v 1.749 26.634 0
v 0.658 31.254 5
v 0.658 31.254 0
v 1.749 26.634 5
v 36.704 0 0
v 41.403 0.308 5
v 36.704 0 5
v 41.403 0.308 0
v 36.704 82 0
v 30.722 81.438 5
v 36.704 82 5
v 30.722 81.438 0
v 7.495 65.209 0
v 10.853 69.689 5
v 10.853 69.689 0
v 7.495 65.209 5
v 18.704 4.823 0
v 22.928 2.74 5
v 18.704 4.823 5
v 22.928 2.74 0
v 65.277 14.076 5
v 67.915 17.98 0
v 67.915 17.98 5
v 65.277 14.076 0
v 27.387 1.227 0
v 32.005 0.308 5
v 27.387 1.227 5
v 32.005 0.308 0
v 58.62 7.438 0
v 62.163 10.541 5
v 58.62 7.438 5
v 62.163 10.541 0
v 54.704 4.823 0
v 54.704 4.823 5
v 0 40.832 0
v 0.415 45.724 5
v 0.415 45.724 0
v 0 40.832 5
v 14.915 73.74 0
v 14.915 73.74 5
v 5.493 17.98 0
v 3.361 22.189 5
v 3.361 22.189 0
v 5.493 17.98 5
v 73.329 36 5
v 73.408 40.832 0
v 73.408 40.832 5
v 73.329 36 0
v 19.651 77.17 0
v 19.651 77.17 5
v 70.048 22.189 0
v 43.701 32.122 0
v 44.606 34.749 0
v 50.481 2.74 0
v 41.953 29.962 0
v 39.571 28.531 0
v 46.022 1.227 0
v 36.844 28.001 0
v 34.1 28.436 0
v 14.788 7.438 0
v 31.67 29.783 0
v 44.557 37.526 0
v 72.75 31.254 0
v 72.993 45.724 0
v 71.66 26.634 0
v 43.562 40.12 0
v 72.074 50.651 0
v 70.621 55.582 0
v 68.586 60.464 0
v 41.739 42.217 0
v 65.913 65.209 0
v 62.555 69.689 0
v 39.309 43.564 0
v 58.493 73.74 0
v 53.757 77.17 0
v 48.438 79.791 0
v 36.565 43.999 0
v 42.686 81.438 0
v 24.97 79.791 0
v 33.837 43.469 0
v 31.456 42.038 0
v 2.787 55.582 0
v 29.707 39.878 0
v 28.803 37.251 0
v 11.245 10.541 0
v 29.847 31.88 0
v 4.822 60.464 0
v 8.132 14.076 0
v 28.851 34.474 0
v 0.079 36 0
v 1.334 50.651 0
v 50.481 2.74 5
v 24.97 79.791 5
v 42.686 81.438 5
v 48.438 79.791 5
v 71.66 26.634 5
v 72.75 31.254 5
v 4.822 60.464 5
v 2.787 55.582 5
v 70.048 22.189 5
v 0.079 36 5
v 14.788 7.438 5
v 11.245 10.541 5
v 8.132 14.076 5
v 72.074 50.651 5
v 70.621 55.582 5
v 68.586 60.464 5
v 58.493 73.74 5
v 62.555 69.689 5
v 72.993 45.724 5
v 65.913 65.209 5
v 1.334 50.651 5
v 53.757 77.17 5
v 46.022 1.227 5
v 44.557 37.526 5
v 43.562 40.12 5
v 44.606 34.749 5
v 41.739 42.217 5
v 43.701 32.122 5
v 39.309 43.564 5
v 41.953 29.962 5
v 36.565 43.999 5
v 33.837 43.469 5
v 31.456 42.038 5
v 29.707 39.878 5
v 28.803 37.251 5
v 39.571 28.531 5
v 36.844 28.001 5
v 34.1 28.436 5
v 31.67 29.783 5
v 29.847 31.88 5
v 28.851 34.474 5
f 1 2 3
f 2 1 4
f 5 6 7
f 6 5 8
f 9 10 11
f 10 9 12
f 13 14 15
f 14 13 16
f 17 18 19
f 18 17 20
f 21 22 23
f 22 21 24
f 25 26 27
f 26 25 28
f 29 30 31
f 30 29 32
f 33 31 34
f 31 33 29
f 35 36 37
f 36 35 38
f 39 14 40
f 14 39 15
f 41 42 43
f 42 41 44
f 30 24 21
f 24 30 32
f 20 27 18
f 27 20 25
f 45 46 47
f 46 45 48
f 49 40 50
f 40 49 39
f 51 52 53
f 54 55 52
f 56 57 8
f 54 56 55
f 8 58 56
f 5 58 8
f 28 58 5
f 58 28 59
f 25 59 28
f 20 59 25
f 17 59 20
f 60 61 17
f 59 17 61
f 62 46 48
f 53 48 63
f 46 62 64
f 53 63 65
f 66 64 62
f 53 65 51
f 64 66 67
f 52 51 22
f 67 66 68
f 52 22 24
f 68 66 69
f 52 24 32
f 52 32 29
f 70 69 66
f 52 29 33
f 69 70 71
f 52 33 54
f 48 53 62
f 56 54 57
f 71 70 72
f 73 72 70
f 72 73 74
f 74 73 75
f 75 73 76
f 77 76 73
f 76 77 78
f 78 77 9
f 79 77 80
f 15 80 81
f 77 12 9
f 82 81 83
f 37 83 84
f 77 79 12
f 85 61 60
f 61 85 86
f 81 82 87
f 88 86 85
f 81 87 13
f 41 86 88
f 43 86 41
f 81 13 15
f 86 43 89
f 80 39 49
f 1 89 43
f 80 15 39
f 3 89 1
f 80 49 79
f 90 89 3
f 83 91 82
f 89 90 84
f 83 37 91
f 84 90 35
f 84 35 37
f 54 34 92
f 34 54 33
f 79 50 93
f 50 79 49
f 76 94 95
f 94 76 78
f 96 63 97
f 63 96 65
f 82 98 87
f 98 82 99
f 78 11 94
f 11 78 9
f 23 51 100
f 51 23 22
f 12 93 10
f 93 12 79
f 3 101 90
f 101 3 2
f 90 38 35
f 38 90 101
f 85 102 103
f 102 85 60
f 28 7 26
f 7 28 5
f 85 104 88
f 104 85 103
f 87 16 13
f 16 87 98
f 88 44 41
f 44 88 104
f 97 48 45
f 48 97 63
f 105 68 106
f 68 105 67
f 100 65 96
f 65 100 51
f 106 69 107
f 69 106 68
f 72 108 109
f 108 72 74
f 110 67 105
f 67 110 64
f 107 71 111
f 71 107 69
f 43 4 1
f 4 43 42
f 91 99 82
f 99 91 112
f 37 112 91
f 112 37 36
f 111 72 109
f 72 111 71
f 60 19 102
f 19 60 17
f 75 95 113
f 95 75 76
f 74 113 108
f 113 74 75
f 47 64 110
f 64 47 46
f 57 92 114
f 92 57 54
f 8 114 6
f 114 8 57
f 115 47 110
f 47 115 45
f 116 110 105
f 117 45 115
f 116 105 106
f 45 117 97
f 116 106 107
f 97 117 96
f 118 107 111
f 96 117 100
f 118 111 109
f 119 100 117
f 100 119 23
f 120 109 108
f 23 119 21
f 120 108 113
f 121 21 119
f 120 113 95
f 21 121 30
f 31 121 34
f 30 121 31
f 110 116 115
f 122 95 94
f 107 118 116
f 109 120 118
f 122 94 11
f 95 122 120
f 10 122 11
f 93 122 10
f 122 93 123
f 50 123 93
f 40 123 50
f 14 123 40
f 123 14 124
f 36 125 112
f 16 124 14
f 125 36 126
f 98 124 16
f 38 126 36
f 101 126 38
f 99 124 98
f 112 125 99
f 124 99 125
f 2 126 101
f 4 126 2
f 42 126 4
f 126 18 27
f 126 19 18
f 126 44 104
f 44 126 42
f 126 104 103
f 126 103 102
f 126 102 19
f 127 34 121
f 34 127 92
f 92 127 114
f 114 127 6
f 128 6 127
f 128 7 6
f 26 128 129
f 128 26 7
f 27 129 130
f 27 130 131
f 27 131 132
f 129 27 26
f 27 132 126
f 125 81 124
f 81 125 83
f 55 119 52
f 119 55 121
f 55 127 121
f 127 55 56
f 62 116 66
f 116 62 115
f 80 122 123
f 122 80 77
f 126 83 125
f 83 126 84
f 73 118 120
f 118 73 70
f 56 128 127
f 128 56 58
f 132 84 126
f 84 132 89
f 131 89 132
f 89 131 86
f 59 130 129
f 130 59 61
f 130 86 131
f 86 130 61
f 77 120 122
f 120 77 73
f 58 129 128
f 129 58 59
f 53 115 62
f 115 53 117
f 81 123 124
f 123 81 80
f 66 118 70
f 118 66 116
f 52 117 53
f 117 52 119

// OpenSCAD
$fn = 32;

// ----------------------------------------------------------------------
// Cam plate: single_lobe cam, base R36
// ----------------------------------------------------------------------

// --- parameters (mm) ---
base_r = 36;              // base circle radius
lobe_h = 10;              // cam lobe rise
bore_r = 8;               // shaft bore radius
plate_t = 5;              // plate thickness, Z (extrusion height)

profile = [[73.329, 36], [73.408, 40.832], [72.993, 45.724], [72.074, 50.651], [70.621, 55.582], [68.586, 60.464], [65.913, 65.209], [62.555, 69.689], [58.493, 73.74], [53.757, 77.17], [48.438, 79.791], [42.686, 81.438], [36.704, 82], [30.722, 81.438], [24.97, 79.791], [19.651, 77.17], [14.915, 73.74], [10.853, 69.689], [7.495, 65.209], [4.822, 60.464], [2.787, 55.582], [1.334, 50.651], [0.415, 45.724], [0, 40.832], [0.079, 36], [0.658, 31.254], [1.749, 26.634], [3.361, 22.189], [5.493, 17.98], [8.132, 14.076], [11.245, 10.541], [14.788, 7.438], [18.704, 4.823], [22.928, 2.74], [27.387, 1.227], [32.005, 0.308], [36.704, 0], [41.403, 0.308], [46.022, 1.227], [50.481, 2.74], [54.704, 4.823], [58.62, 7.438], [62.163, 10.541], [65.277, 14.076], [67.915, 17.98], [70.048, 22.189], [71.66, 26.634], [72.75, 31.254]];  // primary outline, 48 points, counter clockwise
void_1 = [[44.557, 37.526], [43.562, 40.12], [41.739, 42.217], [39.309, 43.564], [36.565, 43.999], [33.837, 43.469], [31.456, 42.038], [29.707, 39.878], [28.803, 37.251], [28.851, 34.474], [29.847, 31.88], [31.67, 29.783], [34.1, 28.436], [36.844, 28.001], [39.571, 28.531], [41.953, 29.962], [43.701, 32.122], [44.606, 34.749]];  // shaft bore, 18 points

// --- the one profile operation ---
difference() {
  linear_extrude(height = plate_t) polygon(points = profile);
  translate([0, 0, -1])
    linear_extrude(height = plate_t + 2) polygon(points = void_1);
}
